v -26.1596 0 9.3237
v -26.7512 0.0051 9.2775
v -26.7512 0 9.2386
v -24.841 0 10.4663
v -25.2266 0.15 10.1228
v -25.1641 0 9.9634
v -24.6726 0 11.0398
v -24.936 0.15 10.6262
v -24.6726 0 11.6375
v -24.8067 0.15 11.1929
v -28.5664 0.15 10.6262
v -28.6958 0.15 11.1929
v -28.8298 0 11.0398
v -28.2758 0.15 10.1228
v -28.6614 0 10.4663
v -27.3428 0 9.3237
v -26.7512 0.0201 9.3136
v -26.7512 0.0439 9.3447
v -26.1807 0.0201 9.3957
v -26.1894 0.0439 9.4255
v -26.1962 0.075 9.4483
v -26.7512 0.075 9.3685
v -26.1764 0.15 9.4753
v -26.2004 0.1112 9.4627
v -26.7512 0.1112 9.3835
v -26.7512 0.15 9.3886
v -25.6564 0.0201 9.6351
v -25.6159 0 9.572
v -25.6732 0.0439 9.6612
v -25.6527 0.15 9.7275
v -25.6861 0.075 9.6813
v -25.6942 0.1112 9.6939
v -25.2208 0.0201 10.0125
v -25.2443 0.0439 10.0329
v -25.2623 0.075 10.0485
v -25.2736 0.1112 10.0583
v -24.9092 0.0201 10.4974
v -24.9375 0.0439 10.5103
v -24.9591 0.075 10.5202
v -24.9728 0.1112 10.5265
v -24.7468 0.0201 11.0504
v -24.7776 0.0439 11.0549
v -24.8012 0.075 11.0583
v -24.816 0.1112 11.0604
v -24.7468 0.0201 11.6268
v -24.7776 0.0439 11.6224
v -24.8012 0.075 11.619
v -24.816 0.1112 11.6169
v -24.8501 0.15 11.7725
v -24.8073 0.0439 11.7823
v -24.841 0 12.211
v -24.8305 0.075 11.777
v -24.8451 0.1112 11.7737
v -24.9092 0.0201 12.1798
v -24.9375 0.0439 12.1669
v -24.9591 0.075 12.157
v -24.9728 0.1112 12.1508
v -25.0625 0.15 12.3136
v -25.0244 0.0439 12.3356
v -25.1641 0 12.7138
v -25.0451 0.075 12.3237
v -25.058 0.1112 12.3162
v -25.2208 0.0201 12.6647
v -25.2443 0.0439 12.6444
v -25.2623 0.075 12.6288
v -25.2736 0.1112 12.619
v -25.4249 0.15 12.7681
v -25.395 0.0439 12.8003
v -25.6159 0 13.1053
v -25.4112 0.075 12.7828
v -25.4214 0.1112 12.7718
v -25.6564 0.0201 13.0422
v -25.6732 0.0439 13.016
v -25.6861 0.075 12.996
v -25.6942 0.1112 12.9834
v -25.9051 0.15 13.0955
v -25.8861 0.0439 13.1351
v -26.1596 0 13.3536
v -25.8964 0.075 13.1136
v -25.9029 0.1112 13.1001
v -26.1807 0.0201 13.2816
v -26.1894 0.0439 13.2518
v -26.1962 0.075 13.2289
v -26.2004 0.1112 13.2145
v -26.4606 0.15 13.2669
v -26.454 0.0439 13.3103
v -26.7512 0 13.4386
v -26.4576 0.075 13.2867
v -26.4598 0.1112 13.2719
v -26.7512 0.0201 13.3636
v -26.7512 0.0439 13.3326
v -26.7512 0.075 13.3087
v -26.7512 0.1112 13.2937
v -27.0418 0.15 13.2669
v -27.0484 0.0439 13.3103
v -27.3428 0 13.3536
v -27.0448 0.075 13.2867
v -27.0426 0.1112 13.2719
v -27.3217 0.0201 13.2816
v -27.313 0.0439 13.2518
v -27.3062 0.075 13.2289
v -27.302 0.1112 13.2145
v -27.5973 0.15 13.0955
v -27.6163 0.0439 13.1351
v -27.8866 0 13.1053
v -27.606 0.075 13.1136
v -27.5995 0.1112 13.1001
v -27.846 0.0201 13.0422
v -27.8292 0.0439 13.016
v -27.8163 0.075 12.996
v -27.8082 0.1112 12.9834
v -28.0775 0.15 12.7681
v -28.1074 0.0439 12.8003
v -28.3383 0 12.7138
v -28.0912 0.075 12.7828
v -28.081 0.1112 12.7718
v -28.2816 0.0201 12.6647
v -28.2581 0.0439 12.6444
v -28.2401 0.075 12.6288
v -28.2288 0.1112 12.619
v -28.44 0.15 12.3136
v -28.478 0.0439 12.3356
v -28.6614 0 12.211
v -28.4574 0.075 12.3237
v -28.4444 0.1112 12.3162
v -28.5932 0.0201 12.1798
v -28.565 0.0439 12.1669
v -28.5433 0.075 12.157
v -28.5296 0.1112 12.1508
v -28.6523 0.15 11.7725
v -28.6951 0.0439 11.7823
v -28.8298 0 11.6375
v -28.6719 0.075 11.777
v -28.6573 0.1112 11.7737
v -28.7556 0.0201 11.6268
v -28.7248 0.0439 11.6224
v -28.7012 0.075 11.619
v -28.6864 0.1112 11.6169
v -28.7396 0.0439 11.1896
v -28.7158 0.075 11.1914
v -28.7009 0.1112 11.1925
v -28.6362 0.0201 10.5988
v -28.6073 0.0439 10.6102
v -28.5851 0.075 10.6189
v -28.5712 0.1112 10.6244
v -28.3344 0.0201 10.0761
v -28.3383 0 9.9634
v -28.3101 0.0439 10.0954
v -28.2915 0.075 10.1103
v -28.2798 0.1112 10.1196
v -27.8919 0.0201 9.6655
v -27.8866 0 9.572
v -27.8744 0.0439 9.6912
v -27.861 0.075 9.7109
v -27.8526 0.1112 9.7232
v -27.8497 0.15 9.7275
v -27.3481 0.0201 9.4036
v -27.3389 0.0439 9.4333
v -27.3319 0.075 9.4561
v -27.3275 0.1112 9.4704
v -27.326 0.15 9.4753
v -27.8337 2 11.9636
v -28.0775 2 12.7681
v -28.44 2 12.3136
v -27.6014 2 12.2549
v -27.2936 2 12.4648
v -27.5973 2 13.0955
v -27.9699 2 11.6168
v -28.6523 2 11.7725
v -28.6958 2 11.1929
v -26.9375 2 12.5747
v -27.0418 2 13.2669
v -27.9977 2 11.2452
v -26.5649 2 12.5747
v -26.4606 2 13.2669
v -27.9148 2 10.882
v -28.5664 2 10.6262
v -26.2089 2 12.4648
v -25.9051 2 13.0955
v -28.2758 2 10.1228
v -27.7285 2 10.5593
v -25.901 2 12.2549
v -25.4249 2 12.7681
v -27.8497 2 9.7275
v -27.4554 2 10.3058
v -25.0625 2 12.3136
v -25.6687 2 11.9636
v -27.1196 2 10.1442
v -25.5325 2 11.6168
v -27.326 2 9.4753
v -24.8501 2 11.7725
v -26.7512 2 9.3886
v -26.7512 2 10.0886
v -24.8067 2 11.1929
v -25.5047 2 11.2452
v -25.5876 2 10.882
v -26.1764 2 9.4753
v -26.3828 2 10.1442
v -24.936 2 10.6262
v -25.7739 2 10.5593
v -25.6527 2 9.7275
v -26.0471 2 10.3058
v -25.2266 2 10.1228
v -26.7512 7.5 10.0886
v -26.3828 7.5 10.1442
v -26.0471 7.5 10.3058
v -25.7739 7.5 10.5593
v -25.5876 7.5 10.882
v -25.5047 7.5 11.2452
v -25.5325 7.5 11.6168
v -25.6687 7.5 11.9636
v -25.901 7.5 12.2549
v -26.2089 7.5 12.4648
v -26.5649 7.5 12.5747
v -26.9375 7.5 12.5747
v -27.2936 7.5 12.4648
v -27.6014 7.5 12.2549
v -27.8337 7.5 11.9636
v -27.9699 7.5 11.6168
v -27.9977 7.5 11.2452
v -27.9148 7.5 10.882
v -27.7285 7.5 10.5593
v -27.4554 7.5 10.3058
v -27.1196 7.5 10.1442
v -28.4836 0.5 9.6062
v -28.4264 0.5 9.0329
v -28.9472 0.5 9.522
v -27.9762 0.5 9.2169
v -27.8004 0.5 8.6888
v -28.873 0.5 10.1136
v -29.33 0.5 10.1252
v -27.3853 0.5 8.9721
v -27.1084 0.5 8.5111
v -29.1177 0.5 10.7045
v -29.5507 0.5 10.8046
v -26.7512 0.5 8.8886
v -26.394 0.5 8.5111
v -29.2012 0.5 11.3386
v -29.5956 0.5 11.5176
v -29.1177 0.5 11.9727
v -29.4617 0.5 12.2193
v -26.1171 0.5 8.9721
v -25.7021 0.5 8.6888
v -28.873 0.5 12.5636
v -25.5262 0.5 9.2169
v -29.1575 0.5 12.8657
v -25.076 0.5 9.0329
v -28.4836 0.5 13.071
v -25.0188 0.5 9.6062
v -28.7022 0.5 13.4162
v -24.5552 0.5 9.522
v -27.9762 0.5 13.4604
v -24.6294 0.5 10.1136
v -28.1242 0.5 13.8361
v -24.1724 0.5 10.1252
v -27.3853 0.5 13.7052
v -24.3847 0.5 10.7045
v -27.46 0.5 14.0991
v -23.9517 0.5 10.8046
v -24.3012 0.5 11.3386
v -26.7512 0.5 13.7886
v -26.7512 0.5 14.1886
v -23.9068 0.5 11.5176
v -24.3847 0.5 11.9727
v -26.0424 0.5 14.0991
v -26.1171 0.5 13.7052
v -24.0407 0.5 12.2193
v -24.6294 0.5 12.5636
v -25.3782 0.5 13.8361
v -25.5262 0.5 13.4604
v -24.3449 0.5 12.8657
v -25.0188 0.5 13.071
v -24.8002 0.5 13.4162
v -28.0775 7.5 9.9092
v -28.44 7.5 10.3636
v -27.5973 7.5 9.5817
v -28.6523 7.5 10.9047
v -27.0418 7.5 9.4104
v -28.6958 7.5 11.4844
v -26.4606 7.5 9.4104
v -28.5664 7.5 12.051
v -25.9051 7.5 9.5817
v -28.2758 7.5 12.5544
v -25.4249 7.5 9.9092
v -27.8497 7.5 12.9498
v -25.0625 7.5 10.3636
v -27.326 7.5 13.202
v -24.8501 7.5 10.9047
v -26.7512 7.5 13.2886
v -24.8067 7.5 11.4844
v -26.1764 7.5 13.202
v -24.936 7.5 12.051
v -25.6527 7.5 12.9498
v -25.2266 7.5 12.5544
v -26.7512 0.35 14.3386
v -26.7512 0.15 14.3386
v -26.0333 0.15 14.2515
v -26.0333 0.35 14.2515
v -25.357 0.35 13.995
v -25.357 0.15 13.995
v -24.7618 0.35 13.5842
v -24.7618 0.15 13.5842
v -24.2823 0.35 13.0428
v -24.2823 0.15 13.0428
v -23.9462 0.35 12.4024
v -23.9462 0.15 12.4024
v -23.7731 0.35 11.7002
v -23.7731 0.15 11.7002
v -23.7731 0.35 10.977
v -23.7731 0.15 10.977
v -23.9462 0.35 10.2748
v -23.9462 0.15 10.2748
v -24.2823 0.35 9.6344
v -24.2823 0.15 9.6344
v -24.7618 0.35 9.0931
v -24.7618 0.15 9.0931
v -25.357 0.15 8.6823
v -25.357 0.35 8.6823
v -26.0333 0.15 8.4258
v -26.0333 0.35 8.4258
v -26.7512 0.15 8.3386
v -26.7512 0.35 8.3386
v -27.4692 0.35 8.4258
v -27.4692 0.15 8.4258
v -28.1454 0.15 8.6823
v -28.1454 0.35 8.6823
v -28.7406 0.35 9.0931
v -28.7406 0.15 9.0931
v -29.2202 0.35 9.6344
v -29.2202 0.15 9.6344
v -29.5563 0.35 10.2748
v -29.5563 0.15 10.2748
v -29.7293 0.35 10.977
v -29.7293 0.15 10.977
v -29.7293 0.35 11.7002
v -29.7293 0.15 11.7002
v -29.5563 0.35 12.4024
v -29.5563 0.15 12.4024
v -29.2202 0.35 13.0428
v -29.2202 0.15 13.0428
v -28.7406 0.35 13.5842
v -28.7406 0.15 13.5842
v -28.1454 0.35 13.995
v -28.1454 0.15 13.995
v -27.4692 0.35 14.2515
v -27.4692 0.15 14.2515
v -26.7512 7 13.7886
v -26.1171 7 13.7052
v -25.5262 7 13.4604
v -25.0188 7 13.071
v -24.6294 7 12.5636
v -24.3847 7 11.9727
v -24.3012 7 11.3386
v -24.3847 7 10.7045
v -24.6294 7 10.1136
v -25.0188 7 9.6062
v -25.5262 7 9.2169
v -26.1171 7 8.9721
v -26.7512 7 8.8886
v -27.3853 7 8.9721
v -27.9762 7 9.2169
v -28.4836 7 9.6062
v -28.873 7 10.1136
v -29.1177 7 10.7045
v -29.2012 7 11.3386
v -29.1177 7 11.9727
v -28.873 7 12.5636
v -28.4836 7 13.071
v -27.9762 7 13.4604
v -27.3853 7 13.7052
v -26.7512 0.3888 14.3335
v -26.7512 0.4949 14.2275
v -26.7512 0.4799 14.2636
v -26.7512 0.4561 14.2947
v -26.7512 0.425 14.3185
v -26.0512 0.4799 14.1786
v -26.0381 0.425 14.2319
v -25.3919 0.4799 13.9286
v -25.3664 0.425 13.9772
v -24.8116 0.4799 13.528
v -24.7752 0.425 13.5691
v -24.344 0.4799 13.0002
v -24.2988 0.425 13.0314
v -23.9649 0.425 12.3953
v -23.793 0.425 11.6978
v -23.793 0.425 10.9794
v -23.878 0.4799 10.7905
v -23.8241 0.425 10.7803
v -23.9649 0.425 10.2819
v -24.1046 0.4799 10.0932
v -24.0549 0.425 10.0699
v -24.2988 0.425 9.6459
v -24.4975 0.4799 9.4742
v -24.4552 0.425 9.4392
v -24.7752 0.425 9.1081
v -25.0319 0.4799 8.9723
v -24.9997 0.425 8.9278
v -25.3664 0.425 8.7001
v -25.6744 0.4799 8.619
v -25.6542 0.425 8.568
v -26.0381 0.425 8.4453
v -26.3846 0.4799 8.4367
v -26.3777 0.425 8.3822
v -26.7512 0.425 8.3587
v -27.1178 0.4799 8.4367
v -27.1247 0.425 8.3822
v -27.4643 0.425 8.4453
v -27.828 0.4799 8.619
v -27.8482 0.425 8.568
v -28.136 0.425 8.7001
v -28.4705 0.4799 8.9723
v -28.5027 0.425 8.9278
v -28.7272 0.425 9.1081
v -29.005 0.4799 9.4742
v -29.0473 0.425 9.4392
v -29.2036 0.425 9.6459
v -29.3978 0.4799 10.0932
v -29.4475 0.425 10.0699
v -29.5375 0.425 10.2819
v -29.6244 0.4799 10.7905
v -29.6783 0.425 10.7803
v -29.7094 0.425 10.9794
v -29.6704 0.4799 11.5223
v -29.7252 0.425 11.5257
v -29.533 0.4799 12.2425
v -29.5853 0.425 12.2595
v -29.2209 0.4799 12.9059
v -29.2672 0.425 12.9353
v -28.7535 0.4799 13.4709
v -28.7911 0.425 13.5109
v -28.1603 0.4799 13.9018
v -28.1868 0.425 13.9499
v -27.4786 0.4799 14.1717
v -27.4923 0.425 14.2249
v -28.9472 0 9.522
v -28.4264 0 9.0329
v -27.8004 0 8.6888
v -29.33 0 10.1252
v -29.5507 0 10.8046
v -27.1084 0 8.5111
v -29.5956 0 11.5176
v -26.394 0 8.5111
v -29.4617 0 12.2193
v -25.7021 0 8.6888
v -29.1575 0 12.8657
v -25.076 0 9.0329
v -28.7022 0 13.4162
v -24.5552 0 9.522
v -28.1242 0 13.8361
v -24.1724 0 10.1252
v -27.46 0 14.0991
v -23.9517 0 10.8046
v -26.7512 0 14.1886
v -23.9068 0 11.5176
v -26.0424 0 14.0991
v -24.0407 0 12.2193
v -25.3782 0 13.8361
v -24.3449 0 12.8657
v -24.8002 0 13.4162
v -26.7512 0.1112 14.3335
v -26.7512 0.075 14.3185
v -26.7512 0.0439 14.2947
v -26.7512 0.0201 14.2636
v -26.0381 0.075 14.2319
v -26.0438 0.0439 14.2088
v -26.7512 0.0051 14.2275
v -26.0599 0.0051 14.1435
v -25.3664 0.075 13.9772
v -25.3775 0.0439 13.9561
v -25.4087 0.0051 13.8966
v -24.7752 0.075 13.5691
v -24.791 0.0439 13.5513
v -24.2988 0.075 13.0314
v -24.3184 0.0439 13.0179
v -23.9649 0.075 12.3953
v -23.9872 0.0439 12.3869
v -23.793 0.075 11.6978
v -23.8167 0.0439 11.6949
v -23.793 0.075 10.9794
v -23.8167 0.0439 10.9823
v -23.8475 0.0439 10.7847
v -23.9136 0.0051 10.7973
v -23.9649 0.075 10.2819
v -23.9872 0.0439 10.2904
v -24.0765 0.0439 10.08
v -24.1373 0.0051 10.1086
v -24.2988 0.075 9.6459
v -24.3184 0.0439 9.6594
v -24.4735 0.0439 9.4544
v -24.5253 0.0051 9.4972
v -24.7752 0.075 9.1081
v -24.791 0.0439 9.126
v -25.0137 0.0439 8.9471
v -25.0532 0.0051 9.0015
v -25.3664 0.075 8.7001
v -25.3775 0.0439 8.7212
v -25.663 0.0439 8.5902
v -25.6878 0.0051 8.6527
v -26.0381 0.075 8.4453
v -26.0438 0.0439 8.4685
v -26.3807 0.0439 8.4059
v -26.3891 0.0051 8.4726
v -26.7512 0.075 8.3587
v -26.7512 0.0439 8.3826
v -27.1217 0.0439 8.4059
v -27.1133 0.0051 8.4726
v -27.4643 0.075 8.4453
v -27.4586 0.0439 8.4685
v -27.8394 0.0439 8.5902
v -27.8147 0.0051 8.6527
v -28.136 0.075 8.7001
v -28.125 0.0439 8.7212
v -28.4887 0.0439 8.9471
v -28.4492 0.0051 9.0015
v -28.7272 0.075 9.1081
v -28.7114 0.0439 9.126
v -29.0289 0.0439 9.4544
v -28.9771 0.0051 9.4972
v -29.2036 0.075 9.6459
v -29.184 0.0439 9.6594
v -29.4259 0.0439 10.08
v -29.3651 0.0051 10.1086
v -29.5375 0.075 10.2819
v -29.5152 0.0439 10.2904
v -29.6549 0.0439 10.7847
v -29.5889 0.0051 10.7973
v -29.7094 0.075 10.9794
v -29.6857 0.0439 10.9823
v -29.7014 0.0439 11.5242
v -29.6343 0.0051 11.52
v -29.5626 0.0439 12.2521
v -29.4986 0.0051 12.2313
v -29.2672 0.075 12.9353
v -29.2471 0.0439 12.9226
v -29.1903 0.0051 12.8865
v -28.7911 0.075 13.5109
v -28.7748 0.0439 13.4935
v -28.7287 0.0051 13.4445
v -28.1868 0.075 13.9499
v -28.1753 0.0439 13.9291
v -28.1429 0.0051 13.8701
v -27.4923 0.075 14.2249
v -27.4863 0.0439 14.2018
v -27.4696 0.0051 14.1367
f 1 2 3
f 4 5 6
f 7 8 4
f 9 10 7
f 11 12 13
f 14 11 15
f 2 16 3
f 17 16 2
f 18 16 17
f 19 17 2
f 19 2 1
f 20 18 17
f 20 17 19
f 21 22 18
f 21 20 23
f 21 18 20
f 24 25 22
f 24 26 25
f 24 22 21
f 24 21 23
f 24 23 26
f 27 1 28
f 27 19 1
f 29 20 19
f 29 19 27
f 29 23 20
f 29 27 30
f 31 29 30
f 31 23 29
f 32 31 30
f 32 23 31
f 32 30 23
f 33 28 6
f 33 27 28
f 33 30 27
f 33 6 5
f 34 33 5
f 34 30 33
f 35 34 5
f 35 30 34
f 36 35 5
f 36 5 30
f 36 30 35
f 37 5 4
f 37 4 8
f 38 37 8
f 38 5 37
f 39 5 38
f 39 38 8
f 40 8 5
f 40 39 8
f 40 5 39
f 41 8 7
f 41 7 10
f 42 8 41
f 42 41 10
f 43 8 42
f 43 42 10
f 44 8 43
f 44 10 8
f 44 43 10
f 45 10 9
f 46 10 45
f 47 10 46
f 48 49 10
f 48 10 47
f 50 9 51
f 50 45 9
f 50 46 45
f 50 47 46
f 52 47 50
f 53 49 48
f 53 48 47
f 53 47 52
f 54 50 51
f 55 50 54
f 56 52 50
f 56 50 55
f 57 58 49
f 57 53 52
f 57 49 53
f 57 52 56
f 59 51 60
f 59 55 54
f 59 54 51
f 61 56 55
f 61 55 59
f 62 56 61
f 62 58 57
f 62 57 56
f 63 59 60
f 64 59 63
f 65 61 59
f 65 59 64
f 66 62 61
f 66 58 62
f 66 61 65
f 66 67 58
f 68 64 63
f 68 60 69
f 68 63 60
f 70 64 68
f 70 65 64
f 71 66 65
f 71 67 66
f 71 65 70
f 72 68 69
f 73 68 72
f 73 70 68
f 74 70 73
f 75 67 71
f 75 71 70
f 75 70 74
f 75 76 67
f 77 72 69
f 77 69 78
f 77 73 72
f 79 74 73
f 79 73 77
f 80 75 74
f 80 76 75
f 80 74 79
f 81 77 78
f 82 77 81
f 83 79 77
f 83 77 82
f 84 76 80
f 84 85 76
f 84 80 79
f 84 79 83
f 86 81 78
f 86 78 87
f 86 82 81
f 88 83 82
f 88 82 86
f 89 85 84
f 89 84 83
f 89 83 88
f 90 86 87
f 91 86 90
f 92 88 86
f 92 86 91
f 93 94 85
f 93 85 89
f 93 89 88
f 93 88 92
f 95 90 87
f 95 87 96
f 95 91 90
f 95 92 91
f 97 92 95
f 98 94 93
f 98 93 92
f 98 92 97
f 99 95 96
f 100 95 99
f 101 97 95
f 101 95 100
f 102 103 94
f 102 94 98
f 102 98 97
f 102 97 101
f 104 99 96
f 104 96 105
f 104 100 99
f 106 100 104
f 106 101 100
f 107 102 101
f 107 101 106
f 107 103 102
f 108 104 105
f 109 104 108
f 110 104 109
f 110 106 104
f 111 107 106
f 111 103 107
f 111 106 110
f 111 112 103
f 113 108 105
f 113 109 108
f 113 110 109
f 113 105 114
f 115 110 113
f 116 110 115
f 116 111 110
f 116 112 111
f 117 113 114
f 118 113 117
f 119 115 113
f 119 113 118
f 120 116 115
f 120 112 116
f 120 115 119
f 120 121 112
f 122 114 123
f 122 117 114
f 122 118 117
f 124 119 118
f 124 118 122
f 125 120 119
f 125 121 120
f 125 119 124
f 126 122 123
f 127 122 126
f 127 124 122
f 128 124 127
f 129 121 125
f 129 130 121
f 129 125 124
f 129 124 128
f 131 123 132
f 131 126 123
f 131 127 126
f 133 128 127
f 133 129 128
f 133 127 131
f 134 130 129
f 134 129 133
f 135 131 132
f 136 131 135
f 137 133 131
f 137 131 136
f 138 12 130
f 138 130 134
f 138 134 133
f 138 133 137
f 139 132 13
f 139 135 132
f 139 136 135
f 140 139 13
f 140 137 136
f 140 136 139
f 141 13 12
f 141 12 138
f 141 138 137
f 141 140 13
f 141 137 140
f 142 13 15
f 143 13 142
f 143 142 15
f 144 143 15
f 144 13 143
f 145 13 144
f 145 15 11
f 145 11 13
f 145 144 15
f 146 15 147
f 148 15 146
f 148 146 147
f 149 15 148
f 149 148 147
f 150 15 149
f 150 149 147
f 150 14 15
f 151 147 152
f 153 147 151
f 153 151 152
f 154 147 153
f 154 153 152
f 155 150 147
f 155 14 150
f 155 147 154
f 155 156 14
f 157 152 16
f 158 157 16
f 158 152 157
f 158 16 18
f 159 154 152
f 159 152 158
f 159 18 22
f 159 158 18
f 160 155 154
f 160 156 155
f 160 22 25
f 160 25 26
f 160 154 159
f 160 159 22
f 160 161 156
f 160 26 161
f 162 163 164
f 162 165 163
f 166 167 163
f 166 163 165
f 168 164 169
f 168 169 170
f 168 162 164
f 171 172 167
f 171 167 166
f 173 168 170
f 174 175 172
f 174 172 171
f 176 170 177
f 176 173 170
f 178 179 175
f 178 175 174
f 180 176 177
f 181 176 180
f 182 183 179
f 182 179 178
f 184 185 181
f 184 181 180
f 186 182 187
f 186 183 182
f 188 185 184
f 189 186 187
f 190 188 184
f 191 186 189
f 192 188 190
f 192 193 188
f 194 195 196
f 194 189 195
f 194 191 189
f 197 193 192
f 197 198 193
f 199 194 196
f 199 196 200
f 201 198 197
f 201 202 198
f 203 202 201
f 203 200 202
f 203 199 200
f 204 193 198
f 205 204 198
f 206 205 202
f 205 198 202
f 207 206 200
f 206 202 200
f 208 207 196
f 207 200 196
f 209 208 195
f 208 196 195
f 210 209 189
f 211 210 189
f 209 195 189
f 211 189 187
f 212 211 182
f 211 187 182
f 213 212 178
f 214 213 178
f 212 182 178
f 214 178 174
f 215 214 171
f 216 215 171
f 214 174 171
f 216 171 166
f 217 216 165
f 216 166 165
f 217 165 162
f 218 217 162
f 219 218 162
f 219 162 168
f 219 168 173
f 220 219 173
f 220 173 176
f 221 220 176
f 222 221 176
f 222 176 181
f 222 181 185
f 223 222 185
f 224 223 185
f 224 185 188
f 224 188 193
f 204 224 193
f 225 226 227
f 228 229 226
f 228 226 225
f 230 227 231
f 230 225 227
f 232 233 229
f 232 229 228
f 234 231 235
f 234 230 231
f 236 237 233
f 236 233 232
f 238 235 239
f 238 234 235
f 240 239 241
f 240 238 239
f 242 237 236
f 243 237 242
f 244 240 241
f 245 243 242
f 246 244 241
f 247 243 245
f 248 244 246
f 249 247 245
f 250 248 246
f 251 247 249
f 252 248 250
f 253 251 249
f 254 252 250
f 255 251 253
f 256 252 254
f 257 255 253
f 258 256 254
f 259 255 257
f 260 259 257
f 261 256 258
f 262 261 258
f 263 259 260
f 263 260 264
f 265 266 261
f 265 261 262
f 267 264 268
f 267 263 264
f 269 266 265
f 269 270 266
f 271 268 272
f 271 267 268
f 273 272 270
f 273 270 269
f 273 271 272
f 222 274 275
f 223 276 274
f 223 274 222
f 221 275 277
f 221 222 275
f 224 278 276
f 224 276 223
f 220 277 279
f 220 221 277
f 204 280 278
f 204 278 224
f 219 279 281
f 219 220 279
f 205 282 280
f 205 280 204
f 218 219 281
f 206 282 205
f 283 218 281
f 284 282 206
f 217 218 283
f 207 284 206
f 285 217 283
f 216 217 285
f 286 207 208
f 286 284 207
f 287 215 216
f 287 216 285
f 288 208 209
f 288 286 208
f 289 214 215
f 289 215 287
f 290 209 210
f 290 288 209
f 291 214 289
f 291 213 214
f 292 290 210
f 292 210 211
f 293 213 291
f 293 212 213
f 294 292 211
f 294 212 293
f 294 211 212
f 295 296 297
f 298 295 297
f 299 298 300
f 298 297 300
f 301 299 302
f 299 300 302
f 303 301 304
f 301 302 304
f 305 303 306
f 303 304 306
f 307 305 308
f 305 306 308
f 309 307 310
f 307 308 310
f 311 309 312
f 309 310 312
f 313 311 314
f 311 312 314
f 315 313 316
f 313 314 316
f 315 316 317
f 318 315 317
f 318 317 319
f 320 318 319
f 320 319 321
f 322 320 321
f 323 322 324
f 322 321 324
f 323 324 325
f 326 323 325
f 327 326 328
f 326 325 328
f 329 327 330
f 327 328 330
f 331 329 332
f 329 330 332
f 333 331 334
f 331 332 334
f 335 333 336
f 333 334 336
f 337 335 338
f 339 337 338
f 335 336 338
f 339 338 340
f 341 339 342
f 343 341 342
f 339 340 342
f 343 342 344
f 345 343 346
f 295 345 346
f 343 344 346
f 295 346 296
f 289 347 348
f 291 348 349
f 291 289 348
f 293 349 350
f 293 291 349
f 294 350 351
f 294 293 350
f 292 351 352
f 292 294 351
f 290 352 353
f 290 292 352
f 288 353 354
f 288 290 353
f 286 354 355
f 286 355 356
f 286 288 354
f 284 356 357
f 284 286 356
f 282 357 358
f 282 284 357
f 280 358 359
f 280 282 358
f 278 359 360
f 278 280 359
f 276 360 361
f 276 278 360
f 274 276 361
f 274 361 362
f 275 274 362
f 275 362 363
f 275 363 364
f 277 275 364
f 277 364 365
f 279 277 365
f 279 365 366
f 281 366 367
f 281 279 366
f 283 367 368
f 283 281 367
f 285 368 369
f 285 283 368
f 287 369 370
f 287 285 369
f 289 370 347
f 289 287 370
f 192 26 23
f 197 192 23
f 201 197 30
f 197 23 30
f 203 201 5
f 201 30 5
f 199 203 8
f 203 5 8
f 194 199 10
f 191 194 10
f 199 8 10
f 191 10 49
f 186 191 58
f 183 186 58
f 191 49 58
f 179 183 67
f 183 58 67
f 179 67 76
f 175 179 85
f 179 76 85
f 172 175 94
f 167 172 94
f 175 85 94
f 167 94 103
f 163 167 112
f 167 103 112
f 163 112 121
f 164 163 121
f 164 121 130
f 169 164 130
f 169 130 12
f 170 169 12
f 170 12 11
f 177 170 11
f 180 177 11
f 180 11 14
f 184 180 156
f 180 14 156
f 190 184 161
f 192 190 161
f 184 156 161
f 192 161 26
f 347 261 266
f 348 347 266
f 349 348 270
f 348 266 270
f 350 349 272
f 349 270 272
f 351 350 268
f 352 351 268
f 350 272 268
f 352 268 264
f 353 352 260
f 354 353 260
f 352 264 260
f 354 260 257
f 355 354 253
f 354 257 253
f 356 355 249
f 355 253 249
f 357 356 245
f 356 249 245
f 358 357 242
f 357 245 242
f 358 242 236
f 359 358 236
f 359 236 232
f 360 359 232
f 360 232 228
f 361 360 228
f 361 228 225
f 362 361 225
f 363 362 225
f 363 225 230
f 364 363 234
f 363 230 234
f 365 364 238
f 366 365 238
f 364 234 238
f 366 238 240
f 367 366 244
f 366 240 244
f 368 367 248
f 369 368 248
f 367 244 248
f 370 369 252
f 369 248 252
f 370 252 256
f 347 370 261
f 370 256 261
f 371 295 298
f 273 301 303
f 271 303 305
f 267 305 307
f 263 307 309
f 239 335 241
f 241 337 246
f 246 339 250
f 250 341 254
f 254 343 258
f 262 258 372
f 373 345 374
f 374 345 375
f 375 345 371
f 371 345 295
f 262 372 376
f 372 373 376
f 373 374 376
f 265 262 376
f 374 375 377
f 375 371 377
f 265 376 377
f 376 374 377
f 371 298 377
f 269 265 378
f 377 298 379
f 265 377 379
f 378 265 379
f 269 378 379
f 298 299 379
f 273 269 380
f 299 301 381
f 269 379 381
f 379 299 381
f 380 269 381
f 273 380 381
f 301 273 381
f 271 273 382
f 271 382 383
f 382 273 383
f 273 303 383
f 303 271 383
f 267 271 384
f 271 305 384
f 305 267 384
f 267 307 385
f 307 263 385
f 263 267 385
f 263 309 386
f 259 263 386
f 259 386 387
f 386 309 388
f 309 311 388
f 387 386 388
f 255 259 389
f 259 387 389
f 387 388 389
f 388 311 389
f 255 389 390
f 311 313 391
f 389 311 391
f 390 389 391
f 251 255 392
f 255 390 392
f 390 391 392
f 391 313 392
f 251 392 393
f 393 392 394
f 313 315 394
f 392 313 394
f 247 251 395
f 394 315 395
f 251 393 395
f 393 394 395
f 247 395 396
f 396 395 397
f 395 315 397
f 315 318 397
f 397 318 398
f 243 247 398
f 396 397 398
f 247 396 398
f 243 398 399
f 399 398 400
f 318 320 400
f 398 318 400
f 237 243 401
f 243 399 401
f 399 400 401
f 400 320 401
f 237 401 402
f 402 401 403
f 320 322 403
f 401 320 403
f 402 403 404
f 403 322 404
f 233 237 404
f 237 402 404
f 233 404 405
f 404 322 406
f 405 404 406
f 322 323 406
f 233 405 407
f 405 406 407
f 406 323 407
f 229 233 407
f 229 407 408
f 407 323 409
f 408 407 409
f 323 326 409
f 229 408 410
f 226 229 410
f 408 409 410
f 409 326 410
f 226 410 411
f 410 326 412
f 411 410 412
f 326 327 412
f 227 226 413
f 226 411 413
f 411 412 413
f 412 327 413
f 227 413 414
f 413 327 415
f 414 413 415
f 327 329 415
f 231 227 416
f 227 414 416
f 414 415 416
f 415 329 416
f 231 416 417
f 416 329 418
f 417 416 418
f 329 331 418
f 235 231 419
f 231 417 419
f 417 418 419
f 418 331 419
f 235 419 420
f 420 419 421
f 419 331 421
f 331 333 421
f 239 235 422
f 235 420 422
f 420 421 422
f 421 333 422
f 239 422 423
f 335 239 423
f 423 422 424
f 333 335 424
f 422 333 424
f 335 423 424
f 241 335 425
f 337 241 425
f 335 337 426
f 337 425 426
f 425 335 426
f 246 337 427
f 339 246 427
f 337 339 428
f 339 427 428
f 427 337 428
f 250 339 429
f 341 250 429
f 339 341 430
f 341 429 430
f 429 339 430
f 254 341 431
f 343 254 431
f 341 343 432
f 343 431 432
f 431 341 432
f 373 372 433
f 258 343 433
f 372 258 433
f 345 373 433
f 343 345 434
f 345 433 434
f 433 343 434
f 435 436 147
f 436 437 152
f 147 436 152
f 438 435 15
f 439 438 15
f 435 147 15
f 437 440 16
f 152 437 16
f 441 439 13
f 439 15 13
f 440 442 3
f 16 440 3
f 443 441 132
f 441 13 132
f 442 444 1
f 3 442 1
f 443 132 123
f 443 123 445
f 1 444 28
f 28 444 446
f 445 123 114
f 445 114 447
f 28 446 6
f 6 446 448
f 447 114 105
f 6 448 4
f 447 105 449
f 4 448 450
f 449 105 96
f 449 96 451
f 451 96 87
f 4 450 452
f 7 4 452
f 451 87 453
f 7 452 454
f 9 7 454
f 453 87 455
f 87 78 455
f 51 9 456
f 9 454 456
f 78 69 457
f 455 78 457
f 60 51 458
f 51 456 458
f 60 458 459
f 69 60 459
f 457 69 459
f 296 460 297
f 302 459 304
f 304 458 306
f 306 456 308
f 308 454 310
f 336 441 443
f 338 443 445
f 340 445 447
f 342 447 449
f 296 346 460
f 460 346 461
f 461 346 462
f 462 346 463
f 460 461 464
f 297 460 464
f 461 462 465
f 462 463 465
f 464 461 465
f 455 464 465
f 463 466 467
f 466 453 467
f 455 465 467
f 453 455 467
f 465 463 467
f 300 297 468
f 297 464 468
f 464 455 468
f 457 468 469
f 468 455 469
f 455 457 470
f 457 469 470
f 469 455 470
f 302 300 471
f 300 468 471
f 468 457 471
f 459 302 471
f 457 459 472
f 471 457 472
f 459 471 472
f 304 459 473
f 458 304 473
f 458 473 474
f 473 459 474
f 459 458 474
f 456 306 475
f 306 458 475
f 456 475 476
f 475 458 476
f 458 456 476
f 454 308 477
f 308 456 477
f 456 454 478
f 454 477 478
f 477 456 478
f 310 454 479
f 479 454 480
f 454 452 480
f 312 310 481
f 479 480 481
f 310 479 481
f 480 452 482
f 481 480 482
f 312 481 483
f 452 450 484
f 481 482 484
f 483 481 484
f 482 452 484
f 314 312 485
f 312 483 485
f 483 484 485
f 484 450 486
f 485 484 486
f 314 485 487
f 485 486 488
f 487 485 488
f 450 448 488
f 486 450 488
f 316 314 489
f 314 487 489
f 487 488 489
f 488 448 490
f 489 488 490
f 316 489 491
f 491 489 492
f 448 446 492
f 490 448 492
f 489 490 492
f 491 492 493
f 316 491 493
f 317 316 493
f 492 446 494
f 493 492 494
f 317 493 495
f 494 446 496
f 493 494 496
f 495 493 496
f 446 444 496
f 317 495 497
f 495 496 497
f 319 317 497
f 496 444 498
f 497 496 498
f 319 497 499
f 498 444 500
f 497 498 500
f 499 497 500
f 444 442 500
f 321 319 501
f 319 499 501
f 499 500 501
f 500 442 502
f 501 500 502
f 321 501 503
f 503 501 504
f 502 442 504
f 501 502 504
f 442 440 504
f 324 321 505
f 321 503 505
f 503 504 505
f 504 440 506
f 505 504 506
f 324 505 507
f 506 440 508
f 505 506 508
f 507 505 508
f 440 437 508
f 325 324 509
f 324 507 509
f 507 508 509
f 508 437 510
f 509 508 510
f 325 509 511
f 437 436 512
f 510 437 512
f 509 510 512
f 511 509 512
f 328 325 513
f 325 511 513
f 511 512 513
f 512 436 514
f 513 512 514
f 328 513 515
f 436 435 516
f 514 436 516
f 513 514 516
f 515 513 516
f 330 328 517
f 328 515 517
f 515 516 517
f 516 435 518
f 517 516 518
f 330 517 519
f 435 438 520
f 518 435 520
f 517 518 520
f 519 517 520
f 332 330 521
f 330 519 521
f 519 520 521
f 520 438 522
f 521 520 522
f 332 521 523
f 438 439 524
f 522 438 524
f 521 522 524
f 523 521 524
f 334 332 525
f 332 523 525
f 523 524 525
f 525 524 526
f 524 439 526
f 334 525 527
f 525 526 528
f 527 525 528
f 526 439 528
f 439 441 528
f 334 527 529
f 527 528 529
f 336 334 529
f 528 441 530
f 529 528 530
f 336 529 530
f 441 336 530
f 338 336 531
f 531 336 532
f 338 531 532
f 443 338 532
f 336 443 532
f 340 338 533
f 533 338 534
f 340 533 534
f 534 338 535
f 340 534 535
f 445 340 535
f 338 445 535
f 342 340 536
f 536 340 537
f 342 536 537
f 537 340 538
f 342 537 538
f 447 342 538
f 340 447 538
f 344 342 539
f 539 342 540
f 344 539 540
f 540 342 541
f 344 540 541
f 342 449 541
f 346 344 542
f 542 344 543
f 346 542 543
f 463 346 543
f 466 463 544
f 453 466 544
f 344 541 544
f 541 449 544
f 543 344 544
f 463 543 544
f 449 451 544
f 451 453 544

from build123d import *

# Parameters (mm, degrees)
ESBO_O1_R                     = 3
EXTRUS_O1_DEPTH               = 0.5
ESBO_O2_R                     = 2.45
EXTRUS_O2_DEPTH               = 7
CHANFRO1_SIZE                 = 0.5
ESBO_O3_R                     = 1.95
EXTRUS_O3_DEPTH               = 2
ESBO_O4_R                     = 1.05
EXTRUS_O4_DEPTH               = 10
FURO_ROSCADO_DE_M3X0_53_D     = 2.5
FURO_ROSCADO_DE_M3X0_53_DEPTH = 8.5
FURO_ROSCADO_DE_M3X0_53_TIP   = 0.751075774
FILETE1_R                     = 0.15


with BuildPart() as part:
    # Esboço1 → Extrusão1 (new body)
    with BuildSketch(Plane(origin=(0, 0, 0), x_dir=(1, 0, 0), z_dir=(0, 1, 0))):
        with Locations(Location((-26.751205923, -11.338633094, 0), (0, 0, 270))):
            Circle(ESBO_O1_R)
    extrude(amount=EXTRUS_O1_DEPTH)

    # Esboço2 → Extrusão2 (add)
    with BuildSketch(Plane(origin=(0, 0.5, 0), x_dir=(1, 0, 0), z_dir=(0, 1, 0))):
        with Locations(Location((-26.751205923, -11.338633094, 0), (0, 0, 270))):
            Circle(ESBO_O2_R)
    extrude(amount=EXTRUS_O2_DEPTH)

    # Chanfro1
    chanfro1_edges = [part.edges().sort_by_distance(p)[0] for p in [
        (-26.751205923, 7.5, 8.888633094),
    ]]
    chamfer(chanfro1_edges, length=CHANFRO1_SIZE)

    # Esboço3 → Extrusão3 (cut)
    with BuildSketch(Plane.XZ):
        with Locations(Location((-26.751205923, 11.338633094, 0), (0, 0, 270))):
            Circle(ESBO_O3_R)
    extrude(amount=-EXTRUS_O3_DEPTH, mode=Mode.SUBTRACT)

    # Esboço4 → Extrusão4 (cut)
    with BuildSketch(Plane(origin=(0, 7.5, 0), x_dir=(1, 0, 0), z_dir=(0, 1, 0))):
        with Locations(Location((-26.751205923, -11.338633094, 0), (0, 0, 270))):
            Circle(ESBO_O4_R)
    extrude(amount=-EXTRUS_O4_DEPTH, mode=Mode.SUBTRACT)

    # Furo roscado de M3x0.53
    with Locations(Plane(origin=(-26.751205923, 7.5, 11.338633094), x_dir=(0, 0, 1), z_dir=(0, 1, 0))):
        with Locations((0, 0)):
            Hole(FURO_ROSCADO_DE_M3X0_53_D / 2, depth=FURO_ROSCADO_DE_M3X0_53_DEPTH)
            with Locations((0, 0, -(FURO_ROSCADO_DE_M3X0_53_DEPTH + FURO_ROSCADO_DE_M3X0_53_TIP / 2))):  # 118° drill point
                Cone(0, FURO_ROSCADO_DE_M3X0_53_D / 2, FURO_ROSCADO_DE_M3X0_53_TIP, mode=Mode.SUBTRACT)

    # Filete1
    filete1_edges = [part.edges().sort_by_distance(p)[0] for p in [
        (-26.751205923, 0, 13.288633094),
        (-26.751205923, 0, 8.338633094),
        (-26.751205923, 0.5, 8.338633094),
    ]]
    fillet(filete1_edges, radius=FILETE1_R)


solid = part.part
